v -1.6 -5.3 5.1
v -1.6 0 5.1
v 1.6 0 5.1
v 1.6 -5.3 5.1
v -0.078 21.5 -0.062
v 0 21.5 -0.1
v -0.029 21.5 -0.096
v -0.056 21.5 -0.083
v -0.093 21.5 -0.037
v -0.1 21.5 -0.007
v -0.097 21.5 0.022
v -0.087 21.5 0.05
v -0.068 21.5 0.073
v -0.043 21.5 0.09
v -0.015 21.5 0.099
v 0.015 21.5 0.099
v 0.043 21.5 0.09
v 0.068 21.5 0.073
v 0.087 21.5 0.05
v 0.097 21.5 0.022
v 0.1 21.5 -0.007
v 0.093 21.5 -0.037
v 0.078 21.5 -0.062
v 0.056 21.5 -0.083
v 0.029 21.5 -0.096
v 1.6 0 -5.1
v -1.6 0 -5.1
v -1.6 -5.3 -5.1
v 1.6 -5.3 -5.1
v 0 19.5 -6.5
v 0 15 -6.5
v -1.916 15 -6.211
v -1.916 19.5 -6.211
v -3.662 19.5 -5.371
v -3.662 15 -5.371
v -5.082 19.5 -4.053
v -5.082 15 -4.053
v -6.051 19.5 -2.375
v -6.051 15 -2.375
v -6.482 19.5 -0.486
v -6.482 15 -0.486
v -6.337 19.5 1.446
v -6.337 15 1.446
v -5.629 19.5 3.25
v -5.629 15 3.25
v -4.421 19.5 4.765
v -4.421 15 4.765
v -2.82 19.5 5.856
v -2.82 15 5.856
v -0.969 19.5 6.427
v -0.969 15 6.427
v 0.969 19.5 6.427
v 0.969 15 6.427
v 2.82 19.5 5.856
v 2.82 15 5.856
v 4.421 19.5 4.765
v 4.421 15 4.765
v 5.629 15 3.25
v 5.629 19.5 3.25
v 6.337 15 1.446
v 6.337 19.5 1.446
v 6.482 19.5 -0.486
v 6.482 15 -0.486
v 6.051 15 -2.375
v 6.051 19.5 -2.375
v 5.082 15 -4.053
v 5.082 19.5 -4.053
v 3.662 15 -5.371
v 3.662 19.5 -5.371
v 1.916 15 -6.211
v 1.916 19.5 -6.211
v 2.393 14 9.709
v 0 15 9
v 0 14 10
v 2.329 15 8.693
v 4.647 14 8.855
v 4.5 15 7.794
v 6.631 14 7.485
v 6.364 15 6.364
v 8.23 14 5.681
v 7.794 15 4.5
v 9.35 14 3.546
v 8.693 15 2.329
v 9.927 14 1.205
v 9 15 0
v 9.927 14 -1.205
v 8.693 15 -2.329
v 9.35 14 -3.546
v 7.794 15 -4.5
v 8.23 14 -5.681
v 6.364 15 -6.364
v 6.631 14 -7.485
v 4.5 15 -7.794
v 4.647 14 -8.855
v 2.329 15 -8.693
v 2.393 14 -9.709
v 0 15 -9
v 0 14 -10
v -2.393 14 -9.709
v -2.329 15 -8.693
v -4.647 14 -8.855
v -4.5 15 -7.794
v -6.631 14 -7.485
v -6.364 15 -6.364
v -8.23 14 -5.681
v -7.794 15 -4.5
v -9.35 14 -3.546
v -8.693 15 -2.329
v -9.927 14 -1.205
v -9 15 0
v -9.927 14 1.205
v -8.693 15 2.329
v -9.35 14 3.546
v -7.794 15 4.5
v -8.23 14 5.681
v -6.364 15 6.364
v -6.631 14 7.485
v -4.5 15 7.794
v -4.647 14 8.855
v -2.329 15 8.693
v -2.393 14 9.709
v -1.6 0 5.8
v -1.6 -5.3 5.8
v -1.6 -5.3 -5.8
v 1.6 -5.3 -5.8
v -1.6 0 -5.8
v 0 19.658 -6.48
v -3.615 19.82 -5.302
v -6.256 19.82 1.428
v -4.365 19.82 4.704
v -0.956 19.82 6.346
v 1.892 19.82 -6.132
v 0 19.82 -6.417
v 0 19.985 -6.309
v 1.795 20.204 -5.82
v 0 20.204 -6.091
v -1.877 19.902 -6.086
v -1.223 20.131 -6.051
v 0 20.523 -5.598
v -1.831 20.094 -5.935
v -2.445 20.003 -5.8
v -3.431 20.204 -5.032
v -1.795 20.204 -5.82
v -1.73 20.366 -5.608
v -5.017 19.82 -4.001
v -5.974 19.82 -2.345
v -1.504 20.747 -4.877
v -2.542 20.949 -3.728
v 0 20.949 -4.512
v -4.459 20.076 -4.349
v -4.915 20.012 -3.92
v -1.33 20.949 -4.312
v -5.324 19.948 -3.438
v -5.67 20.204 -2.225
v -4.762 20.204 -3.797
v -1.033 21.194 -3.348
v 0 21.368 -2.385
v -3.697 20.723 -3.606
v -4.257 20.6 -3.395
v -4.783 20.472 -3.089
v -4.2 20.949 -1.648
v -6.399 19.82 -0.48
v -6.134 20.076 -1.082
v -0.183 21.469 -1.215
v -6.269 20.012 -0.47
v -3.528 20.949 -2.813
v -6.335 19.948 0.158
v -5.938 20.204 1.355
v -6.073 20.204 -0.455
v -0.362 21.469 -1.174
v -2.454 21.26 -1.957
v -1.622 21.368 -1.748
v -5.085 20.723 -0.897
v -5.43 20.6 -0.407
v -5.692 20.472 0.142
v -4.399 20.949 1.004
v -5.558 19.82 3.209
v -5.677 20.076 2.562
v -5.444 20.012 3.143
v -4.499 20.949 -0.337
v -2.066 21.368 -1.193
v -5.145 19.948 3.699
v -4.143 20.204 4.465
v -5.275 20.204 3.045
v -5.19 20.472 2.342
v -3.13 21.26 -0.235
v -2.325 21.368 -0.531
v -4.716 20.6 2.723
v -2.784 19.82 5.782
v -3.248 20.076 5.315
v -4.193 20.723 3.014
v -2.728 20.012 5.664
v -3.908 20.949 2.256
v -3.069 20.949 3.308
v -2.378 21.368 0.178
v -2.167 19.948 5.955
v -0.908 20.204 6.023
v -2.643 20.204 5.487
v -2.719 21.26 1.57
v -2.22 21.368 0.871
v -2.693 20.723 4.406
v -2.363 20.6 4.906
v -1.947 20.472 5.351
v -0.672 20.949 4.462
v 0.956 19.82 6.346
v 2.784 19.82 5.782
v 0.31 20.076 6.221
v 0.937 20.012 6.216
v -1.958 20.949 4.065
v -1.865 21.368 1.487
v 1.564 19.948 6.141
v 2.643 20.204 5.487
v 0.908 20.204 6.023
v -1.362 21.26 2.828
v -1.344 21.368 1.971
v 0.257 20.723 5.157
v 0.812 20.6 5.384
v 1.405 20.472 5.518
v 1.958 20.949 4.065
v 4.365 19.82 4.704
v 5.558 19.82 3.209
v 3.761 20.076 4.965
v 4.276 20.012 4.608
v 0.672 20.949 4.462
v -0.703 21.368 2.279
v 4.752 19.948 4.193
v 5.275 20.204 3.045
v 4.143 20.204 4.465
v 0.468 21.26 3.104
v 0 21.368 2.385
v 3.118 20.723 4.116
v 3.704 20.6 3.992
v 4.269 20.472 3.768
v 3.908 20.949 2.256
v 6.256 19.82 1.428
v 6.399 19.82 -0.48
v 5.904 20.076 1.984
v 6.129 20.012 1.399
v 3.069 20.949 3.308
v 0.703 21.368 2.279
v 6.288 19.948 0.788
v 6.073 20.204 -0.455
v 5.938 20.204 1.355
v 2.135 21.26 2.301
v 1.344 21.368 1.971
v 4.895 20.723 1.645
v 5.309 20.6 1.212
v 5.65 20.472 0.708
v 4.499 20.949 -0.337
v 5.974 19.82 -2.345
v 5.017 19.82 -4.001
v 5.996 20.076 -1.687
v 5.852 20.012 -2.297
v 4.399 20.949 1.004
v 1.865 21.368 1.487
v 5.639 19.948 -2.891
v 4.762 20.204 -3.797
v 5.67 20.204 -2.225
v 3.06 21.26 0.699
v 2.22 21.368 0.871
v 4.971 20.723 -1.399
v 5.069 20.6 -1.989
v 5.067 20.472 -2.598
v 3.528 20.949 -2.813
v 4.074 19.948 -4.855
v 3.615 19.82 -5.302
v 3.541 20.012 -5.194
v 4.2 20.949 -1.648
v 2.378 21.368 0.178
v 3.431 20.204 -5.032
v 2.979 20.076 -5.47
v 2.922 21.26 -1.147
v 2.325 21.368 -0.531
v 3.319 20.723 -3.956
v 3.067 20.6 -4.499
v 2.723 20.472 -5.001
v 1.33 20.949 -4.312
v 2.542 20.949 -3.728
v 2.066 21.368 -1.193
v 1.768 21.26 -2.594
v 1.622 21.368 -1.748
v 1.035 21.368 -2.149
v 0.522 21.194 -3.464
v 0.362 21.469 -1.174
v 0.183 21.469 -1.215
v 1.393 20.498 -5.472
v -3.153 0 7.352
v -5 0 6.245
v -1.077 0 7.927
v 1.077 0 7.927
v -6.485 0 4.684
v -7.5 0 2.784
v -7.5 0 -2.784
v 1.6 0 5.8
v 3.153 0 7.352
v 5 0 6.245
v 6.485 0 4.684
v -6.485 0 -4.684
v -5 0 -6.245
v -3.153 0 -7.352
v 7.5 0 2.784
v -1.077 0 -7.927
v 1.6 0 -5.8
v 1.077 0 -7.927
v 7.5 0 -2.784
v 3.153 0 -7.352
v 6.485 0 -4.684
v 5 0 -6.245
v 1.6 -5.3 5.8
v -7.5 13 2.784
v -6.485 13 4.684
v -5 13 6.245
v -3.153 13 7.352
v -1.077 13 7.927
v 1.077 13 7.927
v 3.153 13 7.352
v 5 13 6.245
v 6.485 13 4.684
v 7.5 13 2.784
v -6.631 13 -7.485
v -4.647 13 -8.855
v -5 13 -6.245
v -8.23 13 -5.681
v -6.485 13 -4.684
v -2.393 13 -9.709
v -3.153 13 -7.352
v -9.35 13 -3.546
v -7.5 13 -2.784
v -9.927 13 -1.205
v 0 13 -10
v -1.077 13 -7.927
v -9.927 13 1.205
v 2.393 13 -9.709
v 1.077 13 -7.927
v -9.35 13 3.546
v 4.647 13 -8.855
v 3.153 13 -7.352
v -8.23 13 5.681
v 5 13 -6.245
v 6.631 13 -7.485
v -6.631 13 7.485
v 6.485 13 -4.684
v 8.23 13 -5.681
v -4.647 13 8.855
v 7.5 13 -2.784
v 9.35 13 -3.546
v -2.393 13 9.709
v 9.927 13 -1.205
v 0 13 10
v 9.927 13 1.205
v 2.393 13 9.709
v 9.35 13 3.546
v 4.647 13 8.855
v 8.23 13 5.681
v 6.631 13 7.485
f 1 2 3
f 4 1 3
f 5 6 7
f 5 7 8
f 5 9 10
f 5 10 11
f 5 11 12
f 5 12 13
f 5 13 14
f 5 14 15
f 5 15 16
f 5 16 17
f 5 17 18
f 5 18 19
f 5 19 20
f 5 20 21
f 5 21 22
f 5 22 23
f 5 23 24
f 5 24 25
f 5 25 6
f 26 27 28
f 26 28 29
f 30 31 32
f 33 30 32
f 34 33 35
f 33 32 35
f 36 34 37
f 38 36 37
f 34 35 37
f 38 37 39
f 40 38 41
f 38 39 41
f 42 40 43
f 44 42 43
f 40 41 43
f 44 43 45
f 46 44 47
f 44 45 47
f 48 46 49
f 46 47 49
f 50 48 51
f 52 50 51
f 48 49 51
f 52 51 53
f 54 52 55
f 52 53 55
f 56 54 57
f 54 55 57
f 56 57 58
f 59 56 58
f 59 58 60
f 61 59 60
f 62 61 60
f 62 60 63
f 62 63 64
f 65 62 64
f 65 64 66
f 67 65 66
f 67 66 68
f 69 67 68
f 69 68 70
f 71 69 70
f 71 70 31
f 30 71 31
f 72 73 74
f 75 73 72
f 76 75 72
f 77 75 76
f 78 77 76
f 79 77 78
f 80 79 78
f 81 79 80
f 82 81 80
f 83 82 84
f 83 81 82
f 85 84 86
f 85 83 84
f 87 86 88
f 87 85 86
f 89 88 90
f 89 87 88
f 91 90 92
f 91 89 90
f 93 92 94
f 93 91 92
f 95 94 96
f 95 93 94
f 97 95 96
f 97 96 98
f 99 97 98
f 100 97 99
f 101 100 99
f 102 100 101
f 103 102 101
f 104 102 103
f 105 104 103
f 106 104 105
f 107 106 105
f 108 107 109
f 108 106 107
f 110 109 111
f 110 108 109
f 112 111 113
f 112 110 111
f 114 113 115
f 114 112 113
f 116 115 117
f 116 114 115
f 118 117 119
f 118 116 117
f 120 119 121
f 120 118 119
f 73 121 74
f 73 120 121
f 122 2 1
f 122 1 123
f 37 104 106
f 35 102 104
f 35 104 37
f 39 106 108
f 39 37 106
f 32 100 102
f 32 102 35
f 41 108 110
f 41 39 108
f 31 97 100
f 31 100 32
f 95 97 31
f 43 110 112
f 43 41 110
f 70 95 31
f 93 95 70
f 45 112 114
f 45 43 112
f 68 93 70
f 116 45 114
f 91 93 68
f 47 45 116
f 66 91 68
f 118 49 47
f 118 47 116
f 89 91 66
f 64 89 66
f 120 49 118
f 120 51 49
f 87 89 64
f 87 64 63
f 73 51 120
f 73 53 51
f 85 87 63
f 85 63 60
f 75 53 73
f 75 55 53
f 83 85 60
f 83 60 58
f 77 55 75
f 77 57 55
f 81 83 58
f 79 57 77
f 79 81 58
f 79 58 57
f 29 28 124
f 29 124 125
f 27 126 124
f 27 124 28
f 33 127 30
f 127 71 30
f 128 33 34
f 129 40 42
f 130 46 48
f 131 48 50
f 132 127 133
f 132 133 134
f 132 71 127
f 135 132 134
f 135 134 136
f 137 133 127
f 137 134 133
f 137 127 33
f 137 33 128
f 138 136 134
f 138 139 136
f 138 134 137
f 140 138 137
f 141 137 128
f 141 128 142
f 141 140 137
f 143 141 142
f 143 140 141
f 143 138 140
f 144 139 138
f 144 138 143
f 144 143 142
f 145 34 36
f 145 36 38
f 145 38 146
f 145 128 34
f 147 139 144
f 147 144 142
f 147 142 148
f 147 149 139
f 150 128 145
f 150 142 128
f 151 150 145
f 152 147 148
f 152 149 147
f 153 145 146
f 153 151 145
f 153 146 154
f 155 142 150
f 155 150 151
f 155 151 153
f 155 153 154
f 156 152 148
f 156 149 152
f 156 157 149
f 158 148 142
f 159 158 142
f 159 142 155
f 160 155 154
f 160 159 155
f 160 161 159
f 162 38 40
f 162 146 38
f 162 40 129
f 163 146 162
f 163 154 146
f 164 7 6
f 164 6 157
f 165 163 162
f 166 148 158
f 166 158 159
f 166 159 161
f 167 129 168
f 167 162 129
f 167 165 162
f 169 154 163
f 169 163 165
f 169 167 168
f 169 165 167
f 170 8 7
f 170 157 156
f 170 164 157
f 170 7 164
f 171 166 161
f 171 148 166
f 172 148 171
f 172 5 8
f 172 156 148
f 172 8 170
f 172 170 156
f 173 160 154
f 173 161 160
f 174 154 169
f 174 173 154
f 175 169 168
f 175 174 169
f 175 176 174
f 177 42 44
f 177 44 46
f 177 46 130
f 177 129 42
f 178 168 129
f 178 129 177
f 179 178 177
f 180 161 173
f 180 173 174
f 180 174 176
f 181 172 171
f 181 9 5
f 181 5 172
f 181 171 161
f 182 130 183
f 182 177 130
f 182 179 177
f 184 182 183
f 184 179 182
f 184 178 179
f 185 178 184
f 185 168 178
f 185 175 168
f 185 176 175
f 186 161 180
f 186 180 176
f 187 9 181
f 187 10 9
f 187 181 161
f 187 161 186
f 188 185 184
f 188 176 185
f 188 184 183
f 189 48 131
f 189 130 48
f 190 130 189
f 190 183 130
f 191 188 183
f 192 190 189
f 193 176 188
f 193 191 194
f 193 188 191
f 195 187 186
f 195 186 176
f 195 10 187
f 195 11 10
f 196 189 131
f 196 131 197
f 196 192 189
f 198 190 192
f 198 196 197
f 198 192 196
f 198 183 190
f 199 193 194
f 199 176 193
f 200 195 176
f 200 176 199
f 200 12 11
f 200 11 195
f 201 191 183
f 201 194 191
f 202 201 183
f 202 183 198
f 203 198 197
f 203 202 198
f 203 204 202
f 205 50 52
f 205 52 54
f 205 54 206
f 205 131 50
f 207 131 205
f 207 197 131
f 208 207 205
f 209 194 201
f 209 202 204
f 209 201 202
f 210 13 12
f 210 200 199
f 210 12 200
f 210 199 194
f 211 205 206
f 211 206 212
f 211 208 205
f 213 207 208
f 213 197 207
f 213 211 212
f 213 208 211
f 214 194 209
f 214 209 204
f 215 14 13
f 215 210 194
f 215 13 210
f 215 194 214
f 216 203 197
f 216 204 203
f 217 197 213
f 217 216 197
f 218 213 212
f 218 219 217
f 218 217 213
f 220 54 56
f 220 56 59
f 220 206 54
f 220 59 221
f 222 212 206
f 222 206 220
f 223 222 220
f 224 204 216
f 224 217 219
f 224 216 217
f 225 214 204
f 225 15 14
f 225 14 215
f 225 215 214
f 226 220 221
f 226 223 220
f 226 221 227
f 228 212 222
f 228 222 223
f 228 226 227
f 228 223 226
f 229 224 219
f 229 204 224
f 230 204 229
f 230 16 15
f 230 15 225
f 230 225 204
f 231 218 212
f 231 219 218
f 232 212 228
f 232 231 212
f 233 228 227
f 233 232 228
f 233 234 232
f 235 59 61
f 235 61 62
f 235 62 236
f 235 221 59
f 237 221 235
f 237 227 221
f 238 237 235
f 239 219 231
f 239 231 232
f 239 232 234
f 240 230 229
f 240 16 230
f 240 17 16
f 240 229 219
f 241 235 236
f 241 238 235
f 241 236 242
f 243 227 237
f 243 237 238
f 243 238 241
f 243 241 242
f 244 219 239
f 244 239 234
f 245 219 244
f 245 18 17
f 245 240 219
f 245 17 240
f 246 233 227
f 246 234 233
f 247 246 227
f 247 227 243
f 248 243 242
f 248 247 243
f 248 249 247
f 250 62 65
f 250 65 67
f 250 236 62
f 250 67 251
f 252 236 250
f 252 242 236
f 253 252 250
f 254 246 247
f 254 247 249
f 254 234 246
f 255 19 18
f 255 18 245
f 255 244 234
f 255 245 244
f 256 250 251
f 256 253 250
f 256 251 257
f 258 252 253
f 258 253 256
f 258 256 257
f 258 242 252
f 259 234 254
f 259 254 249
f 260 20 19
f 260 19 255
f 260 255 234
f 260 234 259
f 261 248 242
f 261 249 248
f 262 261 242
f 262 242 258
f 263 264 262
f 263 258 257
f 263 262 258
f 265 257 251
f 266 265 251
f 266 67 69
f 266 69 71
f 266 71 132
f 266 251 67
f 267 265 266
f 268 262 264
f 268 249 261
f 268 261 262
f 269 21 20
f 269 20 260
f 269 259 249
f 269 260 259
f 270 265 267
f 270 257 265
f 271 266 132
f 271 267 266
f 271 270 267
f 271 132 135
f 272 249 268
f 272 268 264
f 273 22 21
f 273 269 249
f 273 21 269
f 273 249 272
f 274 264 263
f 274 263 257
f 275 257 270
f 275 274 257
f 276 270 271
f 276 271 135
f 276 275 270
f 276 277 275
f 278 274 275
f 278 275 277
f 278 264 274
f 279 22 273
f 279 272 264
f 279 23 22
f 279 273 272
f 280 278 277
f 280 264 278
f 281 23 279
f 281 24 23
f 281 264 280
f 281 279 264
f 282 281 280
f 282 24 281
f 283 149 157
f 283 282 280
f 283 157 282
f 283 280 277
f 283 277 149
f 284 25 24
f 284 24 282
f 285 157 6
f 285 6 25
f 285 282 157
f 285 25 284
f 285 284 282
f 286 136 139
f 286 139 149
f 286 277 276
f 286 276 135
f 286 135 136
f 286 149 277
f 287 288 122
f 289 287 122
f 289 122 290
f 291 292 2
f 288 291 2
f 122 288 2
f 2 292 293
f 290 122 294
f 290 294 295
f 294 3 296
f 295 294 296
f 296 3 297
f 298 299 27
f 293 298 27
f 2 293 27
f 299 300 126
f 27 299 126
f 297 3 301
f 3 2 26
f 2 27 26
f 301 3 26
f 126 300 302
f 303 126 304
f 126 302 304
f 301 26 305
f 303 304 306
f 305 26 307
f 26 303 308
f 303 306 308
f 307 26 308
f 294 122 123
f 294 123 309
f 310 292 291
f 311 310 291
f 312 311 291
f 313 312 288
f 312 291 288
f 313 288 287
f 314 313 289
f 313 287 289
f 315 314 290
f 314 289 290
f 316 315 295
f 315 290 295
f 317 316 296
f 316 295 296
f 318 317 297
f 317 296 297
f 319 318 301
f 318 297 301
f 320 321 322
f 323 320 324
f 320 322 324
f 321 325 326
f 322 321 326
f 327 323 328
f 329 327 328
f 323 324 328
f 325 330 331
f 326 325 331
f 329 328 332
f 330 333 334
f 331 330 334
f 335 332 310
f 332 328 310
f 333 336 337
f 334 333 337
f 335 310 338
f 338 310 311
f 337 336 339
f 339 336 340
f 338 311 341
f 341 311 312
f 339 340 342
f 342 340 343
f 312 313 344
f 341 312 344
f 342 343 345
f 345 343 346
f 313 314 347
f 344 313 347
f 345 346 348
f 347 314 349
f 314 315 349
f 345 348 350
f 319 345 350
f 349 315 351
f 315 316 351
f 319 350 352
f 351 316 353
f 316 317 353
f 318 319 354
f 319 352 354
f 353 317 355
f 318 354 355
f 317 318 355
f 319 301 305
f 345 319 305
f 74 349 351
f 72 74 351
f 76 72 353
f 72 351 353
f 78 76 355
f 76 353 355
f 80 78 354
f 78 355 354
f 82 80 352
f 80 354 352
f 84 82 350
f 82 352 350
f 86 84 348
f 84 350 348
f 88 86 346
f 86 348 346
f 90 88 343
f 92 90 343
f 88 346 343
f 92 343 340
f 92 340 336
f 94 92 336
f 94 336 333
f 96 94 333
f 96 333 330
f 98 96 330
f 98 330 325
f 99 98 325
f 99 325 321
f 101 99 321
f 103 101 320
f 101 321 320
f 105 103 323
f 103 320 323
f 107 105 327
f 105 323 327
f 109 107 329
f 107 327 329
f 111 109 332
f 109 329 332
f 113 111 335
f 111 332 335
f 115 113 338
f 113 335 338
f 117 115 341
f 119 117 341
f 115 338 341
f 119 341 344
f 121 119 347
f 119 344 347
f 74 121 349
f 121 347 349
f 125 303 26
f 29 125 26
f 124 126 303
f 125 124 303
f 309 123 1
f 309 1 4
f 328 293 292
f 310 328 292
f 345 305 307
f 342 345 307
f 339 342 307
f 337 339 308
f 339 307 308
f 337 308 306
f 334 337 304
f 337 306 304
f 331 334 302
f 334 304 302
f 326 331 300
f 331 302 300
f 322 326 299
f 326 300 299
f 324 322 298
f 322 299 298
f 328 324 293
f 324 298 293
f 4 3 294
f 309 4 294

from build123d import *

# Parameters (mm, degrees)
BOSS_EXTRUDE1_DEPTH = 13
SKETCH2_R           = 10
BOSS_EXTRUDE2_DEPTH = 2
CHAMFER1_SIZE       = 1
SKETCH3_R           = 6.5
BOSS_EXTRUDE3_DEPTH = 6.5
FILLET1_SIZE        = 2
FILLET1_SIZE_2      = 6.4
SKETCH4_W           = 3.2
SKETCH4_H           = 0.7
BOSS_EXTRUDE4_DEPTH = 5.3


with BuildPart() as part:
    # Sketch1 → Boss-Extrude1 (new body)
    with BuildSketch(Plane(origin=(0, 0, 0), x_dir=(1, 0, 0), z_dir=(0, 1, 0))):
        with BuildLine():
            Line((-7.5, 2.783882181), (-7.5, -2.783882181))
            ThreePointArc((-7.5, -2.783882181), (0, -8), (7.5, -2.783882181))
            Line((7.5, -2.783882181), (7.5, 2.783882181))
            ThreePointArc((7.5, 2.783882181), (0, 8), (-7.5, 2.783882181))
        make_face()
    extrude(amount=BOSS_EXTRUDE1_DEPTH)

    # Sketch2 → Boss-Extrude2 (add)
    with BuildSketch(Plane(origin=(0, 13, 0), x_dir=(1, 0, 0), z_dir=(0, 1, 0))):
        with Locations(Location((0, 0, 0), (0, 0, 270))):
            Circle(SKETCH2_R)
    extrude(amount=BOSS_EXTRUDE2_DEPTH)

    # Chamfer1
    chamfer1_edges = [part.edges().sort_by_distance(p)[0] for p in [
        (0, 15, -10),
    ]]
    chamfer(chamfer1_edges, length=CHAMFER1_SIZE)

    # Sketch3 → Boss-Extrude3 (add)
    with BuildSketch(Plane(origin=(0, 15, 0), x_dir=(1, 0, 0), z_dir=(0, 1, 0))):
        with Locations(Location((0, 0, 0), (0, 0, 90))):
            Circle(SKETCH3_R)
    extrude(amount=BOSS_EXTRUDE3_DEPTH)

    # Fillet1
    # an asymmetric fillet: 6.4, 2 mm, written as the material it takes off along each edge
    with BuildSketch(Plane(origin=(0, 21.5, 0), x_dir=(0, 0, -1), z_dir=(1, 0, 0))) as fillet1_piece_1:
        with BuildLine():
            Bezier((6.5, -FILLET1_SIZE), (6.5, 0), (6.5 - FILLET1_SIZE_2, 0), weights=[1, 0.707106781, 1])
            Line((6.5 - FILLET1_SIZE_2, 0), (6.5, 0))
            Line((6.5, 0), (6.5, -FILLET1_SIZE))
        make_face()
    revolve(axis=Axis((0, 21.5, 0), (0, 1, 0)), mode=Mode.SUBTRACT)

    # Sketch4 → Boss-Extrude4 (add)
    with BuildSketch(Plane.XZ):
        with Locations((0, 5.45)):
            Rectangle(SKETCH4_W, SKETCH4_H)
        with Locations((0, -5.45)):
            Rectangle(SKETCH4_W, SKETCH4_H)
    extrude(amount=BOSS_EXTRUDE4_DEPTH)


solid = part.part
